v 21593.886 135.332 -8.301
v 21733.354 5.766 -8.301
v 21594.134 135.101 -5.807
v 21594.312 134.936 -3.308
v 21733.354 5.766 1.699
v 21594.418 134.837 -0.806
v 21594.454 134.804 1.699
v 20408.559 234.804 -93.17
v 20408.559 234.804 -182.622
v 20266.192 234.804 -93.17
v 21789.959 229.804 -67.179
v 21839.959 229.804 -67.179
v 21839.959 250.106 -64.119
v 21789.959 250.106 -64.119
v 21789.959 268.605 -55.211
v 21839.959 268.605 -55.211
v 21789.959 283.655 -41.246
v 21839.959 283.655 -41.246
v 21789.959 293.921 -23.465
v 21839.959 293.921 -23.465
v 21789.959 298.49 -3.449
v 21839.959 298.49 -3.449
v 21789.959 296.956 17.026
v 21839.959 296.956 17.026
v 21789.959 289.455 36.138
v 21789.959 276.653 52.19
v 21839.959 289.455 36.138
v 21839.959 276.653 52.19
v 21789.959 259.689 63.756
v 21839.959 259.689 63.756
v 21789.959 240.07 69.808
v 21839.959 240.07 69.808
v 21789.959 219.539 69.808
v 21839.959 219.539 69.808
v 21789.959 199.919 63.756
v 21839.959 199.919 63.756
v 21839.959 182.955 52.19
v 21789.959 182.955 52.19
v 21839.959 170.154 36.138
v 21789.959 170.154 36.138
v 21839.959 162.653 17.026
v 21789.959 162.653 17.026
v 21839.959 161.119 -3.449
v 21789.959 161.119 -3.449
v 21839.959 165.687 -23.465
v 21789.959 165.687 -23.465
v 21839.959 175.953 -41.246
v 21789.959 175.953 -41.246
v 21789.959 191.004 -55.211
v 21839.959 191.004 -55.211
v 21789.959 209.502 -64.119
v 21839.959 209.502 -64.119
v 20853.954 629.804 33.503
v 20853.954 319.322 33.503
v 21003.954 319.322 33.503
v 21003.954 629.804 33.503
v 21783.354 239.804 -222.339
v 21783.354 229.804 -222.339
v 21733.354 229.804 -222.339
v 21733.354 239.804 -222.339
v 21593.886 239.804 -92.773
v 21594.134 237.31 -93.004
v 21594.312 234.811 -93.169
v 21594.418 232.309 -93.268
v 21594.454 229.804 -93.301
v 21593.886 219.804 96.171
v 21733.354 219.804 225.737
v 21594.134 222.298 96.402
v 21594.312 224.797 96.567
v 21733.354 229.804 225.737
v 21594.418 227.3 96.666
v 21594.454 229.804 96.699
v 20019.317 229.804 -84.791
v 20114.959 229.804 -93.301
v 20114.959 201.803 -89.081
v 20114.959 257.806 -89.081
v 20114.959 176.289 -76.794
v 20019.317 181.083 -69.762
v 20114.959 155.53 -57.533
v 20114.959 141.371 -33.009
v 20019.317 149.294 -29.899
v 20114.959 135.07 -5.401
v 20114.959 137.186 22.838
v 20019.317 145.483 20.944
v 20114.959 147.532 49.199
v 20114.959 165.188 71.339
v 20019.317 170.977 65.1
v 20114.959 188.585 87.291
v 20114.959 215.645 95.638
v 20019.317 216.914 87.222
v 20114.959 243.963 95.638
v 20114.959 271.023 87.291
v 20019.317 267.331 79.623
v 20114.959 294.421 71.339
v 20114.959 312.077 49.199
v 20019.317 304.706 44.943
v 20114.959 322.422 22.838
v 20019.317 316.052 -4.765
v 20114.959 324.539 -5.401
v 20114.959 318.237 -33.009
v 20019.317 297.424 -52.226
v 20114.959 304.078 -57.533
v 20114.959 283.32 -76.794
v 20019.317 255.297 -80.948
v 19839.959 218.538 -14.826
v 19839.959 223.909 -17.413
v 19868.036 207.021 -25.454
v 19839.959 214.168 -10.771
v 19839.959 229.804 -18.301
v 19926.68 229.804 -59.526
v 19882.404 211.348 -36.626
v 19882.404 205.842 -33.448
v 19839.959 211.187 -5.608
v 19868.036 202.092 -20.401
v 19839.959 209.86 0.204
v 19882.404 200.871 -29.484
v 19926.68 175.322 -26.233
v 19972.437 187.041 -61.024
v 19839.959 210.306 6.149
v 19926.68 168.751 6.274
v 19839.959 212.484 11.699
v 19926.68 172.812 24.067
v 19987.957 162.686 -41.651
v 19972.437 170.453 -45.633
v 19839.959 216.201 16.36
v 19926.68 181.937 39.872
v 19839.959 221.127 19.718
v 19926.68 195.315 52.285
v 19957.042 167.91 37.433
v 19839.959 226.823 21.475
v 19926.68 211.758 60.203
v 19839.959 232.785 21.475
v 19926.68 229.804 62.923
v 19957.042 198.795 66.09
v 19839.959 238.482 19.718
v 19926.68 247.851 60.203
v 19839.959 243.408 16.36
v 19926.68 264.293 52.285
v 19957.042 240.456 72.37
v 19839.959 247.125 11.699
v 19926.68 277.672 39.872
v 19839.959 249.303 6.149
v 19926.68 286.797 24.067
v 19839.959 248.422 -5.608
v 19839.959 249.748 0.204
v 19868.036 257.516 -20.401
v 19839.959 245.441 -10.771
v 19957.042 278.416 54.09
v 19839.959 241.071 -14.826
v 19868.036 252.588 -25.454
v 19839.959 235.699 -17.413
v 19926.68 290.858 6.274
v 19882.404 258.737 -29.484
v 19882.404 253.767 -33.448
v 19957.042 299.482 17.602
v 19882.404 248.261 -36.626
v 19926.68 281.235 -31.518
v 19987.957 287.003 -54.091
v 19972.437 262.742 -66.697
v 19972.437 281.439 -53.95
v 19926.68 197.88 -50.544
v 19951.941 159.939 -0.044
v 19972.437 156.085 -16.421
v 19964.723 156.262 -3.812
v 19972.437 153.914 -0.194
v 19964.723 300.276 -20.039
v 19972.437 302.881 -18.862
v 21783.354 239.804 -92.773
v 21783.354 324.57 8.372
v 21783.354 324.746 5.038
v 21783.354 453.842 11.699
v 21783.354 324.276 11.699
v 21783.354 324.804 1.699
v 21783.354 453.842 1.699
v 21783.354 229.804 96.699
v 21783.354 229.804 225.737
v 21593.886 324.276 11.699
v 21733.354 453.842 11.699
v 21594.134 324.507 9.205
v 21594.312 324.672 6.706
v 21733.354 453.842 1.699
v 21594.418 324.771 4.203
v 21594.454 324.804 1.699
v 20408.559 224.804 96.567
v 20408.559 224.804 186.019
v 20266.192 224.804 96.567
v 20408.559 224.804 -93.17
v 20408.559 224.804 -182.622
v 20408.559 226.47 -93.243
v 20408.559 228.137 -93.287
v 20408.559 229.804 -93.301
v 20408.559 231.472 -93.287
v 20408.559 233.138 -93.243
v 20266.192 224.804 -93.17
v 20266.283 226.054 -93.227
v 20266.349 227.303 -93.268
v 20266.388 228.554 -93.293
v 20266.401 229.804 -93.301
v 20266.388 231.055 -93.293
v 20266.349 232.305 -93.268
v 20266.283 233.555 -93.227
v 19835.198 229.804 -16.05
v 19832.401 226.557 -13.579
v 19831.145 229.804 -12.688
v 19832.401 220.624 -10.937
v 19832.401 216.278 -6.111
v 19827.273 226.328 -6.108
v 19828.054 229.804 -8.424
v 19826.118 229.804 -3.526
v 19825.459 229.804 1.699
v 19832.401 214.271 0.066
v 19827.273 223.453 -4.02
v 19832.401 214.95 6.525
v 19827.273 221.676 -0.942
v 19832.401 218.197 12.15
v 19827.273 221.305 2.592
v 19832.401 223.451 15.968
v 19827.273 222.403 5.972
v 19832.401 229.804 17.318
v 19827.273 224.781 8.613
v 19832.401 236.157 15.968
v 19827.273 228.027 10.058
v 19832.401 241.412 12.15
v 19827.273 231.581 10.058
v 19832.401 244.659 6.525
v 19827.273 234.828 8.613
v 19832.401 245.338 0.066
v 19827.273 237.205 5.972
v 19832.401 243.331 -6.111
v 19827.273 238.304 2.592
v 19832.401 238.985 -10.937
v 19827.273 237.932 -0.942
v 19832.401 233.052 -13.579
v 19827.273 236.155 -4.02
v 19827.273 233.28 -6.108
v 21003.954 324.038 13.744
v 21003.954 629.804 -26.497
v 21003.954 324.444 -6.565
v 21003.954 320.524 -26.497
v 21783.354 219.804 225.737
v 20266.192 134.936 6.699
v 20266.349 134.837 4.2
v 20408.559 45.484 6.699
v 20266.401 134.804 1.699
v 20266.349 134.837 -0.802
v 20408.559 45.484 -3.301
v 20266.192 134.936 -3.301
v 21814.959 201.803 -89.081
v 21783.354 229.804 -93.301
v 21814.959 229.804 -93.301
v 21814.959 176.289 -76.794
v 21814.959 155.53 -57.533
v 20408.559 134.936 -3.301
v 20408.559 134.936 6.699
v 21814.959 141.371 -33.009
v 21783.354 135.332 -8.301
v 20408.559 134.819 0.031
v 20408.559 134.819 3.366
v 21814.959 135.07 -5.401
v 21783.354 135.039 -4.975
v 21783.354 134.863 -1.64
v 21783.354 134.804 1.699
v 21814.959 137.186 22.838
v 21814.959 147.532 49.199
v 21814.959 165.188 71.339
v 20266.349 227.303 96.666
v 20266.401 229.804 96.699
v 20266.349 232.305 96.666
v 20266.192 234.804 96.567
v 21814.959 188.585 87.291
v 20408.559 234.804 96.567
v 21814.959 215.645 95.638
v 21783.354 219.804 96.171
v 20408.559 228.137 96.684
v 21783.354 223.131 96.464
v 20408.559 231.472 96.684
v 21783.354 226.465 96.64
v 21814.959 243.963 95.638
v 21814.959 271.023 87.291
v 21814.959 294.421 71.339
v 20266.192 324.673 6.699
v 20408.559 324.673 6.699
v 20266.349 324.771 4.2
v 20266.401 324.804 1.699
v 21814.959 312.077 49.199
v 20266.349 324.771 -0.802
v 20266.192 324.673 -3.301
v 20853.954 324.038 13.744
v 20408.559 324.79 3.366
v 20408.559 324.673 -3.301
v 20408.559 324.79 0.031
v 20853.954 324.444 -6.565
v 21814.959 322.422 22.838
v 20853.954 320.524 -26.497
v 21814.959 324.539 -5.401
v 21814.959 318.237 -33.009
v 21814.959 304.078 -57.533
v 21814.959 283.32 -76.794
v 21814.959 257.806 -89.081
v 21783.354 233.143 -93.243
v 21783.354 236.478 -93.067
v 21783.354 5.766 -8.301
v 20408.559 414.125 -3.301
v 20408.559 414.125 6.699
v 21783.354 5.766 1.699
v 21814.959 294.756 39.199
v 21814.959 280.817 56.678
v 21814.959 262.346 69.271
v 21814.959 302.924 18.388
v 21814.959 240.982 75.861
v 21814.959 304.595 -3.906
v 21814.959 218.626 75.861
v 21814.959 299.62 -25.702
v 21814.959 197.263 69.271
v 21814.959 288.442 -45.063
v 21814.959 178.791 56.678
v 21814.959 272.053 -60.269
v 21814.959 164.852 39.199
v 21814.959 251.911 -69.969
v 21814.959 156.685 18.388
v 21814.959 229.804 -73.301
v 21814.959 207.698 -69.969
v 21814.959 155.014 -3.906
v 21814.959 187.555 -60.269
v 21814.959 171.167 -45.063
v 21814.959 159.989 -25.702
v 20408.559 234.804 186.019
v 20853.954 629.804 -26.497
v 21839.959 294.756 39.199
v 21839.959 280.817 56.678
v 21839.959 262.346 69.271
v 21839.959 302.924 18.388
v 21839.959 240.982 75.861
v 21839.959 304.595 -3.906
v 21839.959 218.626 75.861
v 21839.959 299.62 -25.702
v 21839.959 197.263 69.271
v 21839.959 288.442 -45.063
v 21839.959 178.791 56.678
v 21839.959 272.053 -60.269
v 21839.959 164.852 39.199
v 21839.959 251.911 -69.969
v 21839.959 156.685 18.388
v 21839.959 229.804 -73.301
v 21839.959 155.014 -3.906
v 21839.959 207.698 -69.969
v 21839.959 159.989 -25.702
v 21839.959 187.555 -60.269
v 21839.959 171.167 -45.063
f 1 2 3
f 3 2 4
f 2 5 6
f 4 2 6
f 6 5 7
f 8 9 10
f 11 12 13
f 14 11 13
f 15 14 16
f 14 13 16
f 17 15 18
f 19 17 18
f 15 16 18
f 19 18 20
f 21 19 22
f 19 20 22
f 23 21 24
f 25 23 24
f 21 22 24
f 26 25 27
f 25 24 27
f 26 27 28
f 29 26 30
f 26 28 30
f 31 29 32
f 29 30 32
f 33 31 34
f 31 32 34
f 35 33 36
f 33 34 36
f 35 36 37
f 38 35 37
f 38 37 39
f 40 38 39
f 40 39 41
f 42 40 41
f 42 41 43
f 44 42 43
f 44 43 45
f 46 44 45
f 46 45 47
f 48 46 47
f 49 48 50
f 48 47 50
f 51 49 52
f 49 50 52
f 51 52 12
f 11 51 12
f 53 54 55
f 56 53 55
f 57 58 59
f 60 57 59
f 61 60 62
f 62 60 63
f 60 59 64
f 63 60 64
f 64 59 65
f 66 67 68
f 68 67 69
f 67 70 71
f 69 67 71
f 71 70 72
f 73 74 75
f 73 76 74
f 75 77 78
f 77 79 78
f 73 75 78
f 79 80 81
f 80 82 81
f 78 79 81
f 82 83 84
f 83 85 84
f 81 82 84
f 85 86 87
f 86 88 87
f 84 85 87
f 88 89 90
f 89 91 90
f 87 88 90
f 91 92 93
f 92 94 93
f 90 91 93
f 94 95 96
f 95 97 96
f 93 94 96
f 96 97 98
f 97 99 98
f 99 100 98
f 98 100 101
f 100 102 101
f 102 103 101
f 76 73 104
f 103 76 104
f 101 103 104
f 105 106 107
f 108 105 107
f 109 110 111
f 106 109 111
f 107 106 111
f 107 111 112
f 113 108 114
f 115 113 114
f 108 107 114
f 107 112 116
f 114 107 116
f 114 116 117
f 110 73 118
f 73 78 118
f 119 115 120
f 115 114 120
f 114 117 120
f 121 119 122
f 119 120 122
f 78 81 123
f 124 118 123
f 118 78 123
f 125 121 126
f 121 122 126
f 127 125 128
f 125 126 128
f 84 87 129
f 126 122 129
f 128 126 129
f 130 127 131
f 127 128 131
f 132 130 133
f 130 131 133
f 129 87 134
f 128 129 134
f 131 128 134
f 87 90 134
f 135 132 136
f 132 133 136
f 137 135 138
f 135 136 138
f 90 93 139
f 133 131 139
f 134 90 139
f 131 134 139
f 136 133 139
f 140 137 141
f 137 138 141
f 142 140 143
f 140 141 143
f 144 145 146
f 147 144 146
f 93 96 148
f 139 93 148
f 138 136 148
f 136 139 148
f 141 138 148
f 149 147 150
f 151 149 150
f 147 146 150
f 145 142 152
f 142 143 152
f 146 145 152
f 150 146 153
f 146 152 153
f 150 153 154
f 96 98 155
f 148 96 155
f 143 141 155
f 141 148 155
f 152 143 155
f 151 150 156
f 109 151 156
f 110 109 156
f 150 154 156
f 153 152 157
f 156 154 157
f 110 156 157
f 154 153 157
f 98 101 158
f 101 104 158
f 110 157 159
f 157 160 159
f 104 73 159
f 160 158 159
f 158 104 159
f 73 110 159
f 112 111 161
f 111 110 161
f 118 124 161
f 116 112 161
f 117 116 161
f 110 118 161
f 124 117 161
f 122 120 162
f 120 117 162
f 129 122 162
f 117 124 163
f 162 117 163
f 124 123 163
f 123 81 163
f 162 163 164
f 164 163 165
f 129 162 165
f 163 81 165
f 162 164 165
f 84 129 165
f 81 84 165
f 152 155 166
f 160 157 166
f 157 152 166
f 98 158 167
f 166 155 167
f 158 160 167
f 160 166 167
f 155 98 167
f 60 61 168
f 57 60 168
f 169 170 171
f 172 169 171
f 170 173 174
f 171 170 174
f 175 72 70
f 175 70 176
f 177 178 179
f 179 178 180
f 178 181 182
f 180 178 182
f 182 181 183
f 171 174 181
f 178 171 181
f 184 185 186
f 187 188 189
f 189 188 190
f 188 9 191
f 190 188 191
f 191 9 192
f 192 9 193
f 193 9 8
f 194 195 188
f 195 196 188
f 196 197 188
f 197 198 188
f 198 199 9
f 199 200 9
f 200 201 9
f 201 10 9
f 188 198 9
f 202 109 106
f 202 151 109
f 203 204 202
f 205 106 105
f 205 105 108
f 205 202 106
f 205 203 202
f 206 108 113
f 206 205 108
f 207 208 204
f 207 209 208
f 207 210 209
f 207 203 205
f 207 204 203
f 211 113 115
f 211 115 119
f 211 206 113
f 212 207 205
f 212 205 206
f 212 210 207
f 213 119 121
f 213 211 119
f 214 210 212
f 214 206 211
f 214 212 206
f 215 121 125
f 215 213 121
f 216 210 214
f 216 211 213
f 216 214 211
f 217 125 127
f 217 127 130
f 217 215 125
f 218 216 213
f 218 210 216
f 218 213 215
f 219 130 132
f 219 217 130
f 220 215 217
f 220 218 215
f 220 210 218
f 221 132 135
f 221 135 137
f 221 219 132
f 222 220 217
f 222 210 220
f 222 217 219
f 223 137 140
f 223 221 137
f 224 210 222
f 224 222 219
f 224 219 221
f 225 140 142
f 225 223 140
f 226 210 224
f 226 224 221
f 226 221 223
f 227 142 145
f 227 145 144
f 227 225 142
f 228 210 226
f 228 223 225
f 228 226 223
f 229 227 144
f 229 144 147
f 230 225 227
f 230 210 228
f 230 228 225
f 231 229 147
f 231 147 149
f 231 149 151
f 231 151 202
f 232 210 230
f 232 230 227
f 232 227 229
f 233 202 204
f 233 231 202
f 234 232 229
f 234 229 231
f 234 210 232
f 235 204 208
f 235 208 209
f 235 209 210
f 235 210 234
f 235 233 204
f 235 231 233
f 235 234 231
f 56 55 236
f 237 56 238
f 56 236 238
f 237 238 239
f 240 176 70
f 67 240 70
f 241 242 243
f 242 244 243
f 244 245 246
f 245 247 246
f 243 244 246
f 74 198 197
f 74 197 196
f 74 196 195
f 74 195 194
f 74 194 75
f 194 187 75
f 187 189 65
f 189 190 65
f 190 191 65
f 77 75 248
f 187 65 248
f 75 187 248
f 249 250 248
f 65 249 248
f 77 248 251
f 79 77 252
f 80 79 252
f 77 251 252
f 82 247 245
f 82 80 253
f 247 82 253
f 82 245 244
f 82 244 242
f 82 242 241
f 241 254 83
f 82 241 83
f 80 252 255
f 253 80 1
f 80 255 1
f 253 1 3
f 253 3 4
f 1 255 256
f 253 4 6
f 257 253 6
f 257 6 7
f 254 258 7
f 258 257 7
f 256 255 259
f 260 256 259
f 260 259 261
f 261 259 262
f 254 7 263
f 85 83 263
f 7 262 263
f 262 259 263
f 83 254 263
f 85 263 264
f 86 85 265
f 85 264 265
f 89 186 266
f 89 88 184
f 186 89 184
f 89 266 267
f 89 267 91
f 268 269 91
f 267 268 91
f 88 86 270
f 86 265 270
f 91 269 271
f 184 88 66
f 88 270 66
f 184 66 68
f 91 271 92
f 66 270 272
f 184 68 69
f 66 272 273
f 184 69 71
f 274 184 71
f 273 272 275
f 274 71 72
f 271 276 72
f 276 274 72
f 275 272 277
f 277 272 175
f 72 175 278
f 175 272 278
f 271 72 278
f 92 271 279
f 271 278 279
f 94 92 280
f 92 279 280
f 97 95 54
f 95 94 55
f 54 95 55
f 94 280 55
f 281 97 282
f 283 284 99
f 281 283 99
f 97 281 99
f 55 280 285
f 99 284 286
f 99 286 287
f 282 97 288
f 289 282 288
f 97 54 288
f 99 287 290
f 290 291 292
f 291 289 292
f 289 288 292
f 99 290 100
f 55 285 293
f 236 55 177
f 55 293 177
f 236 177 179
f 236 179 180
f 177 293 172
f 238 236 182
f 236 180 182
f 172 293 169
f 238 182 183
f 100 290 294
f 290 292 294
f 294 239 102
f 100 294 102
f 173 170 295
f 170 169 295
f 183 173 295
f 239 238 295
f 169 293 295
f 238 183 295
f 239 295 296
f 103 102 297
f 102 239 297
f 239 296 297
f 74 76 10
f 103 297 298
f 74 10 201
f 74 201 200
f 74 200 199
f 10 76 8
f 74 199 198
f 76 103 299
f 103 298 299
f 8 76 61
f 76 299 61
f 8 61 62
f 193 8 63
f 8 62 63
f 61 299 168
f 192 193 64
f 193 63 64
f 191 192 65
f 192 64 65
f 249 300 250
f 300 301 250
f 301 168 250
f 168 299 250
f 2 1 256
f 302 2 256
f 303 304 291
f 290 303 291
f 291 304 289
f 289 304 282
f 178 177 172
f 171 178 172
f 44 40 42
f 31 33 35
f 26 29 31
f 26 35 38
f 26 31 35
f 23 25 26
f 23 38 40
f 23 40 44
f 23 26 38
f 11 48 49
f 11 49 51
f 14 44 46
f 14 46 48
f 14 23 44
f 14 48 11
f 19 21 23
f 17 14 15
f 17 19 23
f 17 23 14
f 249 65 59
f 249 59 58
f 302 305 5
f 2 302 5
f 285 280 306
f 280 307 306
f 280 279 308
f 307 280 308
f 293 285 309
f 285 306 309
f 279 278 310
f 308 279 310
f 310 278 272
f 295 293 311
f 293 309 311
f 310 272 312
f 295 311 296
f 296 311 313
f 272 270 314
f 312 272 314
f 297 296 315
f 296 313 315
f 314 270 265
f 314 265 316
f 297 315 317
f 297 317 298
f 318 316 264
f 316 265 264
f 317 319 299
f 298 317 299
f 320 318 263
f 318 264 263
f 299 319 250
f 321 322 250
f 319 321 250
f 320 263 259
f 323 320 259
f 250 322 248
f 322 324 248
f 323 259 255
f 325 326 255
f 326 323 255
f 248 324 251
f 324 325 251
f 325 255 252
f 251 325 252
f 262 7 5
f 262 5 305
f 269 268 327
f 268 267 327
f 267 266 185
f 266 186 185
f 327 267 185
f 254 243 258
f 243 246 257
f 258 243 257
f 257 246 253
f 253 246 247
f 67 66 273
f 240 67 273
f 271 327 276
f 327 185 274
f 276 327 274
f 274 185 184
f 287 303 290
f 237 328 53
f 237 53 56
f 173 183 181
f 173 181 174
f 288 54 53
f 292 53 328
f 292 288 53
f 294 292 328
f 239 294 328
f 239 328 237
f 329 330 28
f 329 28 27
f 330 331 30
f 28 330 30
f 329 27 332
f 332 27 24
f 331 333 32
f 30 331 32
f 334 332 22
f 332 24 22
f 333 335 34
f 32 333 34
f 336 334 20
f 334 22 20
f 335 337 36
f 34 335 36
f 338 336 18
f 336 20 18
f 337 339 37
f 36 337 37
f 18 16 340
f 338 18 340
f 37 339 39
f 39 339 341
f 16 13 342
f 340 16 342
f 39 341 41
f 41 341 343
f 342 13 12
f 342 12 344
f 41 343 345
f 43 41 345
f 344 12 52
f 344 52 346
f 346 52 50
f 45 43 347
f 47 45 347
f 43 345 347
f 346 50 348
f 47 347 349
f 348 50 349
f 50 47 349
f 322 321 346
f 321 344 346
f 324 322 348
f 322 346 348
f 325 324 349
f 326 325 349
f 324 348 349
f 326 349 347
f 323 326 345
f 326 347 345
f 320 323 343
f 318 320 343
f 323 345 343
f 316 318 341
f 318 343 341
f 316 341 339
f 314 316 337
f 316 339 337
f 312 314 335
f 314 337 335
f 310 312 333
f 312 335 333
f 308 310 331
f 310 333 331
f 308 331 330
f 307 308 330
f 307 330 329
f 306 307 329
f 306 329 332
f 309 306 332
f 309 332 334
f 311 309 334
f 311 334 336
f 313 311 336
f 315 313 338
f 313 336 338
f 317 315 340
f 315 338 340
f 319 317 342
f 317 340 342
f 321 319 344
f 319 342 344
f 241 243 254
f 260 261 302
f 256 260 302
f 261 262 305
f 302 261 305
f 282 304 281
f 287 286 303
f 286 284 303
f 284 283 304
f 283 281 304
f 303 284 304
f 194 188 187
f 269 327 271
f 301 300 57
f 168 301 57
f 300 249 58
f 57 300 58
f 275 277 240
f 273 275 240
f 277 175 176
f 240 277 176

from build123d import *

# Parameters (mm, degrees)
D_ME1_FACE_RADIUS            = 400
D_ME1_HEIGHT                 = 290
ESQUISSE2_R                  = 1377.564968988
ENL_V_MAT_EXTRU_1_DEPTH      = 1000
BOSS_EXTRU_1_DEPTH           = 200
R_P_TITION_CIRCULAIRE1_COUNT = 4
BOSS_EXTRU_2_DEPTH           = 100
R_P_TITION_CIRCULAIRE2_COUNT = 4
ESQUISSE6_W                  = 3000
ESQUISSE6_H                  = 1200
BOSS_EXTRU_3_DEPTH           = 8000
ECHELLE1_SCALE               = 0.05


with BuildPart() as part:
    # Esquisse1 → Révolution1 (revolve)
    with BuildSketch(Plane(origin=(0, 0, 0), x_dir=(1, 0, 0), z_dir=(0, 1, 0))):
        with BuildLine():
            Line((0, 0), (0, 400))
            ThreePointArc((0, 400), (2649.561437252, 1518.274730075), (5500, 1900))
            Line((5500, 1900), (39500, 1900))
            Line((39500, 1900), (39500, 1500))
            Line((39500, 1500), (40000, 1500))
            Line((40000, 1500), (40000, 0))
            Line((40000, 0), (0, 0))
        make_face()
    revolve(axis=Axis((40000, 0, 0), (-1, 0, 0)))

    # Dôme1: a dome of height H over a round flat face of radius A is a cap of a sphere of radius (A * A + H * H) / (2 * H)
    d_me1_r = (D_ME1_FACE_RADIUS * D_ME1_FACE_RADIUS + D_ME1_HEIGHT * D_ME1_HEIGHT) / (2 * D_ME1_HEIGHT)
    d_me1_base = Plane((0, 0, 0), z_dir=(-1, 0, 0))
    with Locations(d_me1_base.offset(D_ME1_HEIGHT - d_me1_r)):
        d_me1_ball = Sphere(d_me1_r, mode=Mode.PRIVATE)
    add(split(d_me1_ball, bisect_by=d_me1_base, keep=Keep.TOP, mode=Mode.PRIVATE))

    # Esquisse2 → Enlèv. mat.-Extru.1 (cut)
    with BuildSketch(Plane(origin=(40000, 0, 0), x_dir=(0, 0, -1), z_dir=(1, 0, 0))):
        Circle(ESQUISSE2_R)
    extrude(amount=-ENL_V_MAT_EXTRU_1_DEPTH, mode=Mode.SUBTRACT)

    # Esquisse3 → Boss.-Extru.1 (add)
    with BuildSketch(Plane.XY):
        Polygon((38867.882175008, 1693.755150427), (38867.882175008, 4480.75805387), (37867.882175008, 4480.75805387), (34867.882175008, 1693.755150427), align=None)
    boss_extru_1 = extrude(amount=BOSS_EXTRU_1_DEPTH)

    # Répétition circulaire1: Boss.-Extru.1 ×4 about axis
    r_p_tition_circulaire1_axis = Axis((0, 0, 0), (1, 0, 0))
    for i in range(1, R_P_TITION_CIRCULAIRE1_COUNT):
        add(boss_extru_1.rotate(r_p_tition_circulaire1_axis, i * 360 / R_P_TITION_CIRCULAIRE1_COUNT))

    # Esquisse4 → Boss.-Extru.2 (add, symmetric)
    with BuildSketch(Plane.XY):
        Polygon((8155.279549148, 1665.288677311), (11371.991011305, 3686.408268577), (11371.991011305, 1665.288677311), align=None)
    boss_extru_2 = extrude(amount=BOSS_EXTRU_2_DEPTH, both=True)

    # Répétition circulaire2: Boss.-Extru.2 ×4 about axis
    r_p_tition_circulaire2_axis = Axis((0, 0, 0), (1, 0, 0))
    for i in range(1, R_P_TITION_CIRCULAIRE2_COUNT):
        add(boss_extru_2.rotate(r_p_tition_circulaire2_axis, i * 360 / R_P_TITION_CIRCULAIRE2_COUNT))

    # Esquisse6 → Boss.-Extru.3 (add)
    with BuildSketch(Plane(origin=(0, 0, 0), x_dir=(1, 0, 0), z_dir=(0, 1, 0))):
        with Locations((21779.89327035, -36.087335649)):
            Rectangle(ESQUISSE6_W, ESQUISSE6_H)
    extrude(amount=BOSS_EXTRU_3_DEPTH)


with BuildPart() as part_1:
    # Echelle1: scaled about (20884.167787821, 241.899239244, 1.78815963)
    add(part.part.scale(ECHELLE1_SCALE).moved(Location((19839.95939843, 229.804277282, 1.698751648))))


solid = part_1.part
